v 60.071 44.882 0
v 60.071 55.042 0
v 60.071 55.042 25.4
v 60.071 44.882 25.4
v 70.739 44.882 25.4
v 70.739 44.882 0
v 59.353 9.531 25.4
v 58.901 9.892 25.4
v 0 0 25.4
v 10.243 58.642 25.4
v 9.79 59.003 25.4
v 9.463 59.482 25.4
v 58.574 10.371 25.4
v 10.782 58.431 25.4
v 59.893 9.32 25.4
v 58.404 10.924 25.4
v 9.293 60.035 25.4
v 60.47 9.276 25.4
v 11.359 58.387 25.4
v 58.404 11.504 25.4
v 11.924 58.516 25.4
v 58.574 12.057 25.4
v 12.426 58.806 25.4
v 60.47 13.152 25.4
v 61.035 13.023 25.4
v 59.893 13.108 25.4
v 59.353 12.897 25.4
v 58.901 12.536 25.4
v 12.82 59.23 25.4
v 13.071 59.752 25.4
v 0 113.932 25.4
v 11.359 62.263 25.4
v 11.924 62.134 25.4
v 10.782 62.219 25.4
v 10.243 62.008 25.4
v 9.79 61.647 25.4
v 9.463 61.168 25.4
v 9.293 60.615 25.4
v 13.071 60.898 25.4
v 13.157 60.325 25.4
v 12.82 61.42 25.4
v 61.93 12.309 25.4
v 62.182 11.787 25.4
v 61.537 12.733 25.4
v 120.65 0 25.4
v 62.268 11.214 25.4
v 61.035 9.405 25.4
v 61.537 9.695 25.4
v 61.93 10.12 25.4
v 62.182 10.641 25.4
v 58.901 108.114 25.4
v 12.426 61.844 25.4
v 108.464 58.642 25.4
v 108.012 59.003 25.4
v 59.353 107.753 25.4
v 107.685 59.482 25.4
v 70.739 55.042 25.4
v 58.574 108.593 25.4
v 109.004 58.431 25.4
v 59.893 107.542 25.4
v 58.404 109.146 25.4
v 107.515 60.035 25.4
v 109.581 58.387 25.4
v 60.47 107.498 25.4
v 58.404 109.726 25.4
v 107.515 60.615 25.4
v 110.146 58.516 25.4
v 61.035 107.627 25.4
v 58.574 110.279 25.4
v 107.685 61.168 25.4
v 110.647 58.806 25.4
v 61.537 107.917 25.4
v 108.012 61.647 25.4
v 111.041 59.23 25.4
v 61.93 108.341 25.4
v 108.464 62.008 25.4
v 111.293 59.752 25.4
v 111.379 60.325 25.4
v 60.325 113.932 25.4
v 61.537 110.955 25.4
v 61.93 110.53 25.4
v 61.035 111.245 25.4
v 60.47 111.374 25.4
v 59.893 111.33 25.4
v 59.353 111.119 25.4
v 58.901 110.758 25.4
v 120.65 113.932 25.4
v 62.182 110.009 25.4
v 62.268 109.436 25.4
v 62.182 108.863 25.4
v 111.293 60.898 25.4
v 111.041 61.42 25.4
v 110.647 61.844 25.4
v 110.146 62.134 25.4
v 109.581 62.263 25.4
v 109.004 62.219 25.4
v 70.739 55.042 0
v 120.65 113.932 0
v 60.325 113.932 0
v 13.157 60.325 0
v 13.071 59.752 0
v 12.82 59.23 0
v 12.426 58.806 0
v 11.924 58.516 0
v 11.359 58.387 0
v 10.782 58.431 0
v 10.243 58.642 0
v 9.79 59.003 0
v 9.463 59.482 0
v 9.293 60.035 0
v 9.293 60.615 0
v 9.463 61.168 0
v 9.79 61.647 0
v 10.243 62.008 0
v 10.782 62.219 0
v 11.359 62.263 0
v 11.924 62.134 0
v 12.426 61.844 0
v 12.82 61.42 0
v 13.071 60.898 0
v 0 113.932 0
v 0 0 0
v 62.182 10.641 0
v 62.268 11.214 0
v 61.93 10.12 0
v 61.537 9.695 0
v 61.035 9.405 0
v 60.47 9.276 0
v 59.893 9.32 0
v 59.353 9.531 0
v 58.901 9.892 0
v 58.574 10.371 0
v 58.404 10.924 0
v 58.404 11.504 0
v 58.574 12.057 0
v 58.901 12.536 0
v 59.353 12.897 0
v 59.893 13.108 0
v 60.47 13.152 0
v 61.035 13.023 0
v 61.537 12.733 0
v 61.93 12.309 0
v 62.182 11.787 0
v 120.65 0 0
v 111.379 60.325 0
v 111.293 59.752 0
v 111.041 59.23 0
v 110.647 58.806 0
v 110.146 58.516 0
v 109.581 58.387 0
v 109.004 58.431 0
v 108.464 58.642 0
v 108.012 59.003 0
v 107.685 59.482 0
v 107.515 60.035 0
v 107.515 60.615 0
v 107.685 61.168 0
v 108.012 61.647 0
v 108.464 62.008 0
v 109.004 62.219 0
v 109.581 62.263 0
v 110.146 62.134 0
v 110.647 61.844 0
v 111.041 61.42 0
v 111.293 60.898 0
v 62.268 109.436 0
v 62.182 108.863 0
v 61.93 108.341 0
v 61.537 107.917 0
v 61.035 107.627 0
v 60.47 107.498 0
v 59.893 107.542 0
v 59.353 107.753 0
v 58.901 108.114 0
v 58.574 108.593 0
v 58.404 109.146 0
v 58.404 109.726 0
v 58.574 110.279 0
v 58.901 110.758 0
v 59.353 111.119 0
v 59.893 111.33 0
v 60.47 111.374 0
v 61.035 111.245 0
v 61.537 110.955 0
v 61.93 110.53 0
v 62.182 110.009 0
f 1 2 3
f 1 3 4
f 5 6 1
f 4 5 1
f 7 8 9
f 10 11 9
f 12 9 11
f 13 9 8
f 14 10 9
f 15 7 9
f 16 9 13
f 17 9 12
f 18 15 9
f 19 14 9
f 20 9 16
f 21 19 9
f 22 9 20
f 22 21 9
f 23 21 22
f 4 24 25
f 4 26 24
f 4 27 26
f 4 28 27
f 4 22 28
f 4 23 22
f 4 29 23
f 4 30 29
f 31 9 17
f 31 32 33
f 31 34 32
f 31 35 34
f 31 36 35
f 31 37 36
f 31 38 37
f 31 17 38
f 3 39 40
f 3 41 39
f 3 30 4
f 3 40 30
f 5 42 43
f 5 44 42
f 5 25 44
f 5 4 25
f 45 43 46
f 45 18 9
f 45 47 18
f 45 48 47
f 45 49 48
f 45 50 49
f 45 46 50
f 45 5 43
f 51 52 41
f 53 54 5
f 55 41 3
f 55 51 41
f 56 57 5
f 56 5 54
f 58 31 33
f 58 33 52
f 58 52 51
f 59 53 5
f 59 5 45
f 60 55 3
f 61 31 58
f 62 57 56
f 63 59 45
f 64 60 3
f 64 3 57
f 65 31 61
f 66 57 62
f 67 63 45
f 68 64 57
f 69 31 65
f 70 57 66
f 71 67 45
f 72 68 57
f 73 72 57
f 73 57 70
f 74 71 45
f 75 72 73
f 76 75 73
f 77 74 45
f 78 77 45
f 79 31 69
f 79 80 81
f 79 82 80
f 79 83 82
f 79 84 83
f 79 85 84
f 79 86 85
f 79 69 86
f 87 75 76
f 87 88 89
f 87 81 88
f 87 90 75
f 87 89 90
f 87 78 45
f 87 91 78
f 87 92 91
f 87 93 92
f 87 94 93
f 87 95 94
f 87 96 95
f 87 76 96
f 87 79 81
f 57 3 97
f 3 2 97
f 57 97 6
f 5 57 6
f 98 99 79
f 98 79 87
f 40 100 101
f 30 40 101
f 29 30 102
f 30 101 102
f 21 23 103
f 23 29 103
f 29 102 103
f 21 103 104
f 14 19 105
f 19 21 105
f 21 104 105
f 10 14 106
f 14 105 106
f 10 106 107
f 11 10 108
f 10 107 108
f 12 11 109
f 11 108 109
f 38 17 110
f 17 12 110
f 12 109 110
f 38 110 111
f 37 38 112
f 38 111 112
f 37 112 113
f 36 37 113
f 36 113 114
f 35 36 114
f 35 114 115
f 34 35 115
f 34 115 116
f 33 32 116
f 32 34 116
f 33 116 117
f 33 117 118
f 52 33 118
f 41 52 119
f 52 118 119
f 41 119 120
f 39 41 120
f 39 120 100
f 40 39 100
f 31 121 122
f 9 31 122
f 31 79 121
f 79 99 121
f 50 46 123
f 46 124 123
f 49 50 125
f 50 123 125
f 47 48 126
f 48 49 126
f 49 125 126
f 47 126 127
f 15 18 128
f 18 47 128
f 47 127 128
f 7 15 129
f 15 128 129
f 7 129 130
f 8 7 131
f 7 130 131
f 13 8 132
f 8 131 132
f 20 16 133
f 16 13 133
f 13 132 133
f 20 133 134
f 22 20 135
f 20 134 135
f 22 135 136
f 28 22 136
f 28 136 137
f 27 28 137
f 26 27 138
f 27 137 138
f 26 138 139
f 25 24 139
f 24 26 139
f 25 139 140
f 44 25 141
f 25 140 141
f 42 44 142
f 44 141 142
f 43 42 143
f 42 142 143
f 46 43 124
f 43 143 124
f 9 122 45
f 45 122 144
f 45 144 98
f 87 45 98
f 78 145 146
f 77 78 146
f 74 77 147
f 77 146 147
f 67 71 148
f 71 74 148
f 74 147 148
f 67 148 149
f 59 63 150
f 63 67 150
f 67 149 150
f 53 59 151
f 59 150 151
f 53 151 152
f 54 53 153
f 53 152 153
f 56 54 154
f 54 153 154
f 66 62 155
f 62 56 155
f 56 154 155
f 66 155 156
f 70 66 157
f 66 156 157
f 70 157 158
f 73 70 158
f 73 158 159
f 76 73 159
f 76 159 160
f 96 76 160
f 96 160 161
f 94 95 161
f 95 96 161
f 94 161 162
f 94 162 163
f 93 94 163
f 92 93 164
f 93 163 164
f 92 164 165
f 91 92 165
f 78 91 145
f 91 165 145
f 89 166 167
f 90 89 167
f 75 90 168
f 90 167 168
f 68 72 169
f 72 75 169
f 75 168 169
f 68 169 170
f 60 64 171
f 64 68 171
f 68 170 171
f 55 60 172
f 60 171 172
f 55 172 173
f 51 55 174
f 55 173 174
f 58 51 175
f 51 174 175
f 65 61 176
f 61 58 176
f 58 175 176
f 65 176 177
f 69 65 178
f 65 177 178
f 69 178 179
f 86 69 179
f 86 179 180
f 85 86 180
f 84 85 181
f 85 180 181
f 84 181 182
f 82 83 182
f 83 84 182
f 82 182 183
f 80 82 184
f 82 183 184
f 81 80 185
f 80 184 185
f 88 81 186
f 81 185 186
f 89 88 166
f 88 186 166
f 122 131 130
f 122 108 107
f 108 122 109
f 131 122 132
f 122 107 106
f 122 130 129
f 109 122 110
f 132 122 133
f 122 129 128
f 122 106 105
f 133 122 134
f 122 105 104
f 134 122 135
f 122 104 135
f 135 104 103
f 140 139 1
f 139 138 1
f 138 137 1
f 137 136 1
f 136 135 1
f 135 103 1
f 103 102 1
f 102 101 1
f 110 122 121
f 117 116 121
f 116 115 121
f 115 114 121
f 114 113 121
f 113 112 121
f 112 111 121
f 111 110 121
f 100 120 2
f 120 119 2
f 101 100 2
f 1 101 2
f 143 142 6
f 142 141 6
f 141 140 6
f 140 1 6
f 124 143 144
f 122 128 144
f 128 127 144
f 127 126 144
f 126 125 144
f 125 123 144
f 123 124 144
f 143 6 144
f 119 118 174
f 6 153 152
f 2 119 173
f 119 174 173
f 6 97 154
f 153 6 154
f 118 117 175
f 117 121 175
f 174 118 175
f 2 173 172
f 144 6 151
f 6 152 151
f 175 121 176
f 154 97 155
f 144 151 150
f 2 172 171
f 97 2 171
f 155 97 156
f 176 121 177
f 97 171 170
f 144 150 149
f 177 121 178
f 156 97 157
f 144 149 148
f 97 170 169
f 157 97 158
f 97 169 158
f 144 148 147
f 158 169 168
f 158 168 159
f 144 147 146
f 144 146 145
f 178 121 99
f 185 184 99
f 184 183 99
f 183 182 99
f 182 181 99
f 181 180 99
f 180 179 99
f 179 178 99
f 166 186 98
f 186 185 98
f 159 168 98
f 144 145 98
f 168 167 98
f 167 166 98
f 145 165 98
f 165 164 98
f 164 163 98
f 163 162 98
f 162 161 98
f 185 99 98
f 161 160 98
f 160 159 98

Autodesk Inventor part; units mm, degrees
ref_plane "YZ Plane" through (0, 0, 0) normal (1, 0, 0) x (0, 1, 0)
ref_plane "XZ Plane" through (0, 0, 0) normal (0, 1, 0) x (-1, 0, 0)
ref_plane "XY Plane" through (0, 0, 0) normal (0, 0, 1) x (1, 0, 0)
sketch "Sketch1" plane through (0, 0, 0) normal (0, 0, 1) x (1, 0, 0)
  line L0 (0, 0) -> (120.65, 0)
  line L1 (120.65, 0) -> (120.65, 113.9317)
  line L2 (0, 113.9317) -> (0, 0)
  circle A0 centre (11.2141, 60.325) radius 1.9431
  circle A1 centre (60.325, 11.2141) radius 1.9431
  circle A2 centre (109.4359, 60.325) radius 1.9431
  circle A3 centre (60.325, 109.4359) radius 1.9431
  line L3 (60.071, 55.0418) -> (70.739, 55.0418)
  line L4 (70.739, 44.8818) -> (60.071, 44.8818)
  line L5 (60.071, 55.0418) -> (60.071, 44.8818)
  line L6 (70.739, 55.0418) -> (70.739, 44.8818)
  line L7 (60.325, 113.9317) -> (120.65, 113.9317)
  line L8 (60.325, 113.9317) -> (0, 113.9317)
  point P0 (60.325, 60.325)
  dimension "d10" = 3.8862
  dimension "d13" = 360
  dimension "d44" = 4.4958
extrude "Extrusion6" add sketch "Sketch1" along normal blind 25.4
properties part number "speakerback"
